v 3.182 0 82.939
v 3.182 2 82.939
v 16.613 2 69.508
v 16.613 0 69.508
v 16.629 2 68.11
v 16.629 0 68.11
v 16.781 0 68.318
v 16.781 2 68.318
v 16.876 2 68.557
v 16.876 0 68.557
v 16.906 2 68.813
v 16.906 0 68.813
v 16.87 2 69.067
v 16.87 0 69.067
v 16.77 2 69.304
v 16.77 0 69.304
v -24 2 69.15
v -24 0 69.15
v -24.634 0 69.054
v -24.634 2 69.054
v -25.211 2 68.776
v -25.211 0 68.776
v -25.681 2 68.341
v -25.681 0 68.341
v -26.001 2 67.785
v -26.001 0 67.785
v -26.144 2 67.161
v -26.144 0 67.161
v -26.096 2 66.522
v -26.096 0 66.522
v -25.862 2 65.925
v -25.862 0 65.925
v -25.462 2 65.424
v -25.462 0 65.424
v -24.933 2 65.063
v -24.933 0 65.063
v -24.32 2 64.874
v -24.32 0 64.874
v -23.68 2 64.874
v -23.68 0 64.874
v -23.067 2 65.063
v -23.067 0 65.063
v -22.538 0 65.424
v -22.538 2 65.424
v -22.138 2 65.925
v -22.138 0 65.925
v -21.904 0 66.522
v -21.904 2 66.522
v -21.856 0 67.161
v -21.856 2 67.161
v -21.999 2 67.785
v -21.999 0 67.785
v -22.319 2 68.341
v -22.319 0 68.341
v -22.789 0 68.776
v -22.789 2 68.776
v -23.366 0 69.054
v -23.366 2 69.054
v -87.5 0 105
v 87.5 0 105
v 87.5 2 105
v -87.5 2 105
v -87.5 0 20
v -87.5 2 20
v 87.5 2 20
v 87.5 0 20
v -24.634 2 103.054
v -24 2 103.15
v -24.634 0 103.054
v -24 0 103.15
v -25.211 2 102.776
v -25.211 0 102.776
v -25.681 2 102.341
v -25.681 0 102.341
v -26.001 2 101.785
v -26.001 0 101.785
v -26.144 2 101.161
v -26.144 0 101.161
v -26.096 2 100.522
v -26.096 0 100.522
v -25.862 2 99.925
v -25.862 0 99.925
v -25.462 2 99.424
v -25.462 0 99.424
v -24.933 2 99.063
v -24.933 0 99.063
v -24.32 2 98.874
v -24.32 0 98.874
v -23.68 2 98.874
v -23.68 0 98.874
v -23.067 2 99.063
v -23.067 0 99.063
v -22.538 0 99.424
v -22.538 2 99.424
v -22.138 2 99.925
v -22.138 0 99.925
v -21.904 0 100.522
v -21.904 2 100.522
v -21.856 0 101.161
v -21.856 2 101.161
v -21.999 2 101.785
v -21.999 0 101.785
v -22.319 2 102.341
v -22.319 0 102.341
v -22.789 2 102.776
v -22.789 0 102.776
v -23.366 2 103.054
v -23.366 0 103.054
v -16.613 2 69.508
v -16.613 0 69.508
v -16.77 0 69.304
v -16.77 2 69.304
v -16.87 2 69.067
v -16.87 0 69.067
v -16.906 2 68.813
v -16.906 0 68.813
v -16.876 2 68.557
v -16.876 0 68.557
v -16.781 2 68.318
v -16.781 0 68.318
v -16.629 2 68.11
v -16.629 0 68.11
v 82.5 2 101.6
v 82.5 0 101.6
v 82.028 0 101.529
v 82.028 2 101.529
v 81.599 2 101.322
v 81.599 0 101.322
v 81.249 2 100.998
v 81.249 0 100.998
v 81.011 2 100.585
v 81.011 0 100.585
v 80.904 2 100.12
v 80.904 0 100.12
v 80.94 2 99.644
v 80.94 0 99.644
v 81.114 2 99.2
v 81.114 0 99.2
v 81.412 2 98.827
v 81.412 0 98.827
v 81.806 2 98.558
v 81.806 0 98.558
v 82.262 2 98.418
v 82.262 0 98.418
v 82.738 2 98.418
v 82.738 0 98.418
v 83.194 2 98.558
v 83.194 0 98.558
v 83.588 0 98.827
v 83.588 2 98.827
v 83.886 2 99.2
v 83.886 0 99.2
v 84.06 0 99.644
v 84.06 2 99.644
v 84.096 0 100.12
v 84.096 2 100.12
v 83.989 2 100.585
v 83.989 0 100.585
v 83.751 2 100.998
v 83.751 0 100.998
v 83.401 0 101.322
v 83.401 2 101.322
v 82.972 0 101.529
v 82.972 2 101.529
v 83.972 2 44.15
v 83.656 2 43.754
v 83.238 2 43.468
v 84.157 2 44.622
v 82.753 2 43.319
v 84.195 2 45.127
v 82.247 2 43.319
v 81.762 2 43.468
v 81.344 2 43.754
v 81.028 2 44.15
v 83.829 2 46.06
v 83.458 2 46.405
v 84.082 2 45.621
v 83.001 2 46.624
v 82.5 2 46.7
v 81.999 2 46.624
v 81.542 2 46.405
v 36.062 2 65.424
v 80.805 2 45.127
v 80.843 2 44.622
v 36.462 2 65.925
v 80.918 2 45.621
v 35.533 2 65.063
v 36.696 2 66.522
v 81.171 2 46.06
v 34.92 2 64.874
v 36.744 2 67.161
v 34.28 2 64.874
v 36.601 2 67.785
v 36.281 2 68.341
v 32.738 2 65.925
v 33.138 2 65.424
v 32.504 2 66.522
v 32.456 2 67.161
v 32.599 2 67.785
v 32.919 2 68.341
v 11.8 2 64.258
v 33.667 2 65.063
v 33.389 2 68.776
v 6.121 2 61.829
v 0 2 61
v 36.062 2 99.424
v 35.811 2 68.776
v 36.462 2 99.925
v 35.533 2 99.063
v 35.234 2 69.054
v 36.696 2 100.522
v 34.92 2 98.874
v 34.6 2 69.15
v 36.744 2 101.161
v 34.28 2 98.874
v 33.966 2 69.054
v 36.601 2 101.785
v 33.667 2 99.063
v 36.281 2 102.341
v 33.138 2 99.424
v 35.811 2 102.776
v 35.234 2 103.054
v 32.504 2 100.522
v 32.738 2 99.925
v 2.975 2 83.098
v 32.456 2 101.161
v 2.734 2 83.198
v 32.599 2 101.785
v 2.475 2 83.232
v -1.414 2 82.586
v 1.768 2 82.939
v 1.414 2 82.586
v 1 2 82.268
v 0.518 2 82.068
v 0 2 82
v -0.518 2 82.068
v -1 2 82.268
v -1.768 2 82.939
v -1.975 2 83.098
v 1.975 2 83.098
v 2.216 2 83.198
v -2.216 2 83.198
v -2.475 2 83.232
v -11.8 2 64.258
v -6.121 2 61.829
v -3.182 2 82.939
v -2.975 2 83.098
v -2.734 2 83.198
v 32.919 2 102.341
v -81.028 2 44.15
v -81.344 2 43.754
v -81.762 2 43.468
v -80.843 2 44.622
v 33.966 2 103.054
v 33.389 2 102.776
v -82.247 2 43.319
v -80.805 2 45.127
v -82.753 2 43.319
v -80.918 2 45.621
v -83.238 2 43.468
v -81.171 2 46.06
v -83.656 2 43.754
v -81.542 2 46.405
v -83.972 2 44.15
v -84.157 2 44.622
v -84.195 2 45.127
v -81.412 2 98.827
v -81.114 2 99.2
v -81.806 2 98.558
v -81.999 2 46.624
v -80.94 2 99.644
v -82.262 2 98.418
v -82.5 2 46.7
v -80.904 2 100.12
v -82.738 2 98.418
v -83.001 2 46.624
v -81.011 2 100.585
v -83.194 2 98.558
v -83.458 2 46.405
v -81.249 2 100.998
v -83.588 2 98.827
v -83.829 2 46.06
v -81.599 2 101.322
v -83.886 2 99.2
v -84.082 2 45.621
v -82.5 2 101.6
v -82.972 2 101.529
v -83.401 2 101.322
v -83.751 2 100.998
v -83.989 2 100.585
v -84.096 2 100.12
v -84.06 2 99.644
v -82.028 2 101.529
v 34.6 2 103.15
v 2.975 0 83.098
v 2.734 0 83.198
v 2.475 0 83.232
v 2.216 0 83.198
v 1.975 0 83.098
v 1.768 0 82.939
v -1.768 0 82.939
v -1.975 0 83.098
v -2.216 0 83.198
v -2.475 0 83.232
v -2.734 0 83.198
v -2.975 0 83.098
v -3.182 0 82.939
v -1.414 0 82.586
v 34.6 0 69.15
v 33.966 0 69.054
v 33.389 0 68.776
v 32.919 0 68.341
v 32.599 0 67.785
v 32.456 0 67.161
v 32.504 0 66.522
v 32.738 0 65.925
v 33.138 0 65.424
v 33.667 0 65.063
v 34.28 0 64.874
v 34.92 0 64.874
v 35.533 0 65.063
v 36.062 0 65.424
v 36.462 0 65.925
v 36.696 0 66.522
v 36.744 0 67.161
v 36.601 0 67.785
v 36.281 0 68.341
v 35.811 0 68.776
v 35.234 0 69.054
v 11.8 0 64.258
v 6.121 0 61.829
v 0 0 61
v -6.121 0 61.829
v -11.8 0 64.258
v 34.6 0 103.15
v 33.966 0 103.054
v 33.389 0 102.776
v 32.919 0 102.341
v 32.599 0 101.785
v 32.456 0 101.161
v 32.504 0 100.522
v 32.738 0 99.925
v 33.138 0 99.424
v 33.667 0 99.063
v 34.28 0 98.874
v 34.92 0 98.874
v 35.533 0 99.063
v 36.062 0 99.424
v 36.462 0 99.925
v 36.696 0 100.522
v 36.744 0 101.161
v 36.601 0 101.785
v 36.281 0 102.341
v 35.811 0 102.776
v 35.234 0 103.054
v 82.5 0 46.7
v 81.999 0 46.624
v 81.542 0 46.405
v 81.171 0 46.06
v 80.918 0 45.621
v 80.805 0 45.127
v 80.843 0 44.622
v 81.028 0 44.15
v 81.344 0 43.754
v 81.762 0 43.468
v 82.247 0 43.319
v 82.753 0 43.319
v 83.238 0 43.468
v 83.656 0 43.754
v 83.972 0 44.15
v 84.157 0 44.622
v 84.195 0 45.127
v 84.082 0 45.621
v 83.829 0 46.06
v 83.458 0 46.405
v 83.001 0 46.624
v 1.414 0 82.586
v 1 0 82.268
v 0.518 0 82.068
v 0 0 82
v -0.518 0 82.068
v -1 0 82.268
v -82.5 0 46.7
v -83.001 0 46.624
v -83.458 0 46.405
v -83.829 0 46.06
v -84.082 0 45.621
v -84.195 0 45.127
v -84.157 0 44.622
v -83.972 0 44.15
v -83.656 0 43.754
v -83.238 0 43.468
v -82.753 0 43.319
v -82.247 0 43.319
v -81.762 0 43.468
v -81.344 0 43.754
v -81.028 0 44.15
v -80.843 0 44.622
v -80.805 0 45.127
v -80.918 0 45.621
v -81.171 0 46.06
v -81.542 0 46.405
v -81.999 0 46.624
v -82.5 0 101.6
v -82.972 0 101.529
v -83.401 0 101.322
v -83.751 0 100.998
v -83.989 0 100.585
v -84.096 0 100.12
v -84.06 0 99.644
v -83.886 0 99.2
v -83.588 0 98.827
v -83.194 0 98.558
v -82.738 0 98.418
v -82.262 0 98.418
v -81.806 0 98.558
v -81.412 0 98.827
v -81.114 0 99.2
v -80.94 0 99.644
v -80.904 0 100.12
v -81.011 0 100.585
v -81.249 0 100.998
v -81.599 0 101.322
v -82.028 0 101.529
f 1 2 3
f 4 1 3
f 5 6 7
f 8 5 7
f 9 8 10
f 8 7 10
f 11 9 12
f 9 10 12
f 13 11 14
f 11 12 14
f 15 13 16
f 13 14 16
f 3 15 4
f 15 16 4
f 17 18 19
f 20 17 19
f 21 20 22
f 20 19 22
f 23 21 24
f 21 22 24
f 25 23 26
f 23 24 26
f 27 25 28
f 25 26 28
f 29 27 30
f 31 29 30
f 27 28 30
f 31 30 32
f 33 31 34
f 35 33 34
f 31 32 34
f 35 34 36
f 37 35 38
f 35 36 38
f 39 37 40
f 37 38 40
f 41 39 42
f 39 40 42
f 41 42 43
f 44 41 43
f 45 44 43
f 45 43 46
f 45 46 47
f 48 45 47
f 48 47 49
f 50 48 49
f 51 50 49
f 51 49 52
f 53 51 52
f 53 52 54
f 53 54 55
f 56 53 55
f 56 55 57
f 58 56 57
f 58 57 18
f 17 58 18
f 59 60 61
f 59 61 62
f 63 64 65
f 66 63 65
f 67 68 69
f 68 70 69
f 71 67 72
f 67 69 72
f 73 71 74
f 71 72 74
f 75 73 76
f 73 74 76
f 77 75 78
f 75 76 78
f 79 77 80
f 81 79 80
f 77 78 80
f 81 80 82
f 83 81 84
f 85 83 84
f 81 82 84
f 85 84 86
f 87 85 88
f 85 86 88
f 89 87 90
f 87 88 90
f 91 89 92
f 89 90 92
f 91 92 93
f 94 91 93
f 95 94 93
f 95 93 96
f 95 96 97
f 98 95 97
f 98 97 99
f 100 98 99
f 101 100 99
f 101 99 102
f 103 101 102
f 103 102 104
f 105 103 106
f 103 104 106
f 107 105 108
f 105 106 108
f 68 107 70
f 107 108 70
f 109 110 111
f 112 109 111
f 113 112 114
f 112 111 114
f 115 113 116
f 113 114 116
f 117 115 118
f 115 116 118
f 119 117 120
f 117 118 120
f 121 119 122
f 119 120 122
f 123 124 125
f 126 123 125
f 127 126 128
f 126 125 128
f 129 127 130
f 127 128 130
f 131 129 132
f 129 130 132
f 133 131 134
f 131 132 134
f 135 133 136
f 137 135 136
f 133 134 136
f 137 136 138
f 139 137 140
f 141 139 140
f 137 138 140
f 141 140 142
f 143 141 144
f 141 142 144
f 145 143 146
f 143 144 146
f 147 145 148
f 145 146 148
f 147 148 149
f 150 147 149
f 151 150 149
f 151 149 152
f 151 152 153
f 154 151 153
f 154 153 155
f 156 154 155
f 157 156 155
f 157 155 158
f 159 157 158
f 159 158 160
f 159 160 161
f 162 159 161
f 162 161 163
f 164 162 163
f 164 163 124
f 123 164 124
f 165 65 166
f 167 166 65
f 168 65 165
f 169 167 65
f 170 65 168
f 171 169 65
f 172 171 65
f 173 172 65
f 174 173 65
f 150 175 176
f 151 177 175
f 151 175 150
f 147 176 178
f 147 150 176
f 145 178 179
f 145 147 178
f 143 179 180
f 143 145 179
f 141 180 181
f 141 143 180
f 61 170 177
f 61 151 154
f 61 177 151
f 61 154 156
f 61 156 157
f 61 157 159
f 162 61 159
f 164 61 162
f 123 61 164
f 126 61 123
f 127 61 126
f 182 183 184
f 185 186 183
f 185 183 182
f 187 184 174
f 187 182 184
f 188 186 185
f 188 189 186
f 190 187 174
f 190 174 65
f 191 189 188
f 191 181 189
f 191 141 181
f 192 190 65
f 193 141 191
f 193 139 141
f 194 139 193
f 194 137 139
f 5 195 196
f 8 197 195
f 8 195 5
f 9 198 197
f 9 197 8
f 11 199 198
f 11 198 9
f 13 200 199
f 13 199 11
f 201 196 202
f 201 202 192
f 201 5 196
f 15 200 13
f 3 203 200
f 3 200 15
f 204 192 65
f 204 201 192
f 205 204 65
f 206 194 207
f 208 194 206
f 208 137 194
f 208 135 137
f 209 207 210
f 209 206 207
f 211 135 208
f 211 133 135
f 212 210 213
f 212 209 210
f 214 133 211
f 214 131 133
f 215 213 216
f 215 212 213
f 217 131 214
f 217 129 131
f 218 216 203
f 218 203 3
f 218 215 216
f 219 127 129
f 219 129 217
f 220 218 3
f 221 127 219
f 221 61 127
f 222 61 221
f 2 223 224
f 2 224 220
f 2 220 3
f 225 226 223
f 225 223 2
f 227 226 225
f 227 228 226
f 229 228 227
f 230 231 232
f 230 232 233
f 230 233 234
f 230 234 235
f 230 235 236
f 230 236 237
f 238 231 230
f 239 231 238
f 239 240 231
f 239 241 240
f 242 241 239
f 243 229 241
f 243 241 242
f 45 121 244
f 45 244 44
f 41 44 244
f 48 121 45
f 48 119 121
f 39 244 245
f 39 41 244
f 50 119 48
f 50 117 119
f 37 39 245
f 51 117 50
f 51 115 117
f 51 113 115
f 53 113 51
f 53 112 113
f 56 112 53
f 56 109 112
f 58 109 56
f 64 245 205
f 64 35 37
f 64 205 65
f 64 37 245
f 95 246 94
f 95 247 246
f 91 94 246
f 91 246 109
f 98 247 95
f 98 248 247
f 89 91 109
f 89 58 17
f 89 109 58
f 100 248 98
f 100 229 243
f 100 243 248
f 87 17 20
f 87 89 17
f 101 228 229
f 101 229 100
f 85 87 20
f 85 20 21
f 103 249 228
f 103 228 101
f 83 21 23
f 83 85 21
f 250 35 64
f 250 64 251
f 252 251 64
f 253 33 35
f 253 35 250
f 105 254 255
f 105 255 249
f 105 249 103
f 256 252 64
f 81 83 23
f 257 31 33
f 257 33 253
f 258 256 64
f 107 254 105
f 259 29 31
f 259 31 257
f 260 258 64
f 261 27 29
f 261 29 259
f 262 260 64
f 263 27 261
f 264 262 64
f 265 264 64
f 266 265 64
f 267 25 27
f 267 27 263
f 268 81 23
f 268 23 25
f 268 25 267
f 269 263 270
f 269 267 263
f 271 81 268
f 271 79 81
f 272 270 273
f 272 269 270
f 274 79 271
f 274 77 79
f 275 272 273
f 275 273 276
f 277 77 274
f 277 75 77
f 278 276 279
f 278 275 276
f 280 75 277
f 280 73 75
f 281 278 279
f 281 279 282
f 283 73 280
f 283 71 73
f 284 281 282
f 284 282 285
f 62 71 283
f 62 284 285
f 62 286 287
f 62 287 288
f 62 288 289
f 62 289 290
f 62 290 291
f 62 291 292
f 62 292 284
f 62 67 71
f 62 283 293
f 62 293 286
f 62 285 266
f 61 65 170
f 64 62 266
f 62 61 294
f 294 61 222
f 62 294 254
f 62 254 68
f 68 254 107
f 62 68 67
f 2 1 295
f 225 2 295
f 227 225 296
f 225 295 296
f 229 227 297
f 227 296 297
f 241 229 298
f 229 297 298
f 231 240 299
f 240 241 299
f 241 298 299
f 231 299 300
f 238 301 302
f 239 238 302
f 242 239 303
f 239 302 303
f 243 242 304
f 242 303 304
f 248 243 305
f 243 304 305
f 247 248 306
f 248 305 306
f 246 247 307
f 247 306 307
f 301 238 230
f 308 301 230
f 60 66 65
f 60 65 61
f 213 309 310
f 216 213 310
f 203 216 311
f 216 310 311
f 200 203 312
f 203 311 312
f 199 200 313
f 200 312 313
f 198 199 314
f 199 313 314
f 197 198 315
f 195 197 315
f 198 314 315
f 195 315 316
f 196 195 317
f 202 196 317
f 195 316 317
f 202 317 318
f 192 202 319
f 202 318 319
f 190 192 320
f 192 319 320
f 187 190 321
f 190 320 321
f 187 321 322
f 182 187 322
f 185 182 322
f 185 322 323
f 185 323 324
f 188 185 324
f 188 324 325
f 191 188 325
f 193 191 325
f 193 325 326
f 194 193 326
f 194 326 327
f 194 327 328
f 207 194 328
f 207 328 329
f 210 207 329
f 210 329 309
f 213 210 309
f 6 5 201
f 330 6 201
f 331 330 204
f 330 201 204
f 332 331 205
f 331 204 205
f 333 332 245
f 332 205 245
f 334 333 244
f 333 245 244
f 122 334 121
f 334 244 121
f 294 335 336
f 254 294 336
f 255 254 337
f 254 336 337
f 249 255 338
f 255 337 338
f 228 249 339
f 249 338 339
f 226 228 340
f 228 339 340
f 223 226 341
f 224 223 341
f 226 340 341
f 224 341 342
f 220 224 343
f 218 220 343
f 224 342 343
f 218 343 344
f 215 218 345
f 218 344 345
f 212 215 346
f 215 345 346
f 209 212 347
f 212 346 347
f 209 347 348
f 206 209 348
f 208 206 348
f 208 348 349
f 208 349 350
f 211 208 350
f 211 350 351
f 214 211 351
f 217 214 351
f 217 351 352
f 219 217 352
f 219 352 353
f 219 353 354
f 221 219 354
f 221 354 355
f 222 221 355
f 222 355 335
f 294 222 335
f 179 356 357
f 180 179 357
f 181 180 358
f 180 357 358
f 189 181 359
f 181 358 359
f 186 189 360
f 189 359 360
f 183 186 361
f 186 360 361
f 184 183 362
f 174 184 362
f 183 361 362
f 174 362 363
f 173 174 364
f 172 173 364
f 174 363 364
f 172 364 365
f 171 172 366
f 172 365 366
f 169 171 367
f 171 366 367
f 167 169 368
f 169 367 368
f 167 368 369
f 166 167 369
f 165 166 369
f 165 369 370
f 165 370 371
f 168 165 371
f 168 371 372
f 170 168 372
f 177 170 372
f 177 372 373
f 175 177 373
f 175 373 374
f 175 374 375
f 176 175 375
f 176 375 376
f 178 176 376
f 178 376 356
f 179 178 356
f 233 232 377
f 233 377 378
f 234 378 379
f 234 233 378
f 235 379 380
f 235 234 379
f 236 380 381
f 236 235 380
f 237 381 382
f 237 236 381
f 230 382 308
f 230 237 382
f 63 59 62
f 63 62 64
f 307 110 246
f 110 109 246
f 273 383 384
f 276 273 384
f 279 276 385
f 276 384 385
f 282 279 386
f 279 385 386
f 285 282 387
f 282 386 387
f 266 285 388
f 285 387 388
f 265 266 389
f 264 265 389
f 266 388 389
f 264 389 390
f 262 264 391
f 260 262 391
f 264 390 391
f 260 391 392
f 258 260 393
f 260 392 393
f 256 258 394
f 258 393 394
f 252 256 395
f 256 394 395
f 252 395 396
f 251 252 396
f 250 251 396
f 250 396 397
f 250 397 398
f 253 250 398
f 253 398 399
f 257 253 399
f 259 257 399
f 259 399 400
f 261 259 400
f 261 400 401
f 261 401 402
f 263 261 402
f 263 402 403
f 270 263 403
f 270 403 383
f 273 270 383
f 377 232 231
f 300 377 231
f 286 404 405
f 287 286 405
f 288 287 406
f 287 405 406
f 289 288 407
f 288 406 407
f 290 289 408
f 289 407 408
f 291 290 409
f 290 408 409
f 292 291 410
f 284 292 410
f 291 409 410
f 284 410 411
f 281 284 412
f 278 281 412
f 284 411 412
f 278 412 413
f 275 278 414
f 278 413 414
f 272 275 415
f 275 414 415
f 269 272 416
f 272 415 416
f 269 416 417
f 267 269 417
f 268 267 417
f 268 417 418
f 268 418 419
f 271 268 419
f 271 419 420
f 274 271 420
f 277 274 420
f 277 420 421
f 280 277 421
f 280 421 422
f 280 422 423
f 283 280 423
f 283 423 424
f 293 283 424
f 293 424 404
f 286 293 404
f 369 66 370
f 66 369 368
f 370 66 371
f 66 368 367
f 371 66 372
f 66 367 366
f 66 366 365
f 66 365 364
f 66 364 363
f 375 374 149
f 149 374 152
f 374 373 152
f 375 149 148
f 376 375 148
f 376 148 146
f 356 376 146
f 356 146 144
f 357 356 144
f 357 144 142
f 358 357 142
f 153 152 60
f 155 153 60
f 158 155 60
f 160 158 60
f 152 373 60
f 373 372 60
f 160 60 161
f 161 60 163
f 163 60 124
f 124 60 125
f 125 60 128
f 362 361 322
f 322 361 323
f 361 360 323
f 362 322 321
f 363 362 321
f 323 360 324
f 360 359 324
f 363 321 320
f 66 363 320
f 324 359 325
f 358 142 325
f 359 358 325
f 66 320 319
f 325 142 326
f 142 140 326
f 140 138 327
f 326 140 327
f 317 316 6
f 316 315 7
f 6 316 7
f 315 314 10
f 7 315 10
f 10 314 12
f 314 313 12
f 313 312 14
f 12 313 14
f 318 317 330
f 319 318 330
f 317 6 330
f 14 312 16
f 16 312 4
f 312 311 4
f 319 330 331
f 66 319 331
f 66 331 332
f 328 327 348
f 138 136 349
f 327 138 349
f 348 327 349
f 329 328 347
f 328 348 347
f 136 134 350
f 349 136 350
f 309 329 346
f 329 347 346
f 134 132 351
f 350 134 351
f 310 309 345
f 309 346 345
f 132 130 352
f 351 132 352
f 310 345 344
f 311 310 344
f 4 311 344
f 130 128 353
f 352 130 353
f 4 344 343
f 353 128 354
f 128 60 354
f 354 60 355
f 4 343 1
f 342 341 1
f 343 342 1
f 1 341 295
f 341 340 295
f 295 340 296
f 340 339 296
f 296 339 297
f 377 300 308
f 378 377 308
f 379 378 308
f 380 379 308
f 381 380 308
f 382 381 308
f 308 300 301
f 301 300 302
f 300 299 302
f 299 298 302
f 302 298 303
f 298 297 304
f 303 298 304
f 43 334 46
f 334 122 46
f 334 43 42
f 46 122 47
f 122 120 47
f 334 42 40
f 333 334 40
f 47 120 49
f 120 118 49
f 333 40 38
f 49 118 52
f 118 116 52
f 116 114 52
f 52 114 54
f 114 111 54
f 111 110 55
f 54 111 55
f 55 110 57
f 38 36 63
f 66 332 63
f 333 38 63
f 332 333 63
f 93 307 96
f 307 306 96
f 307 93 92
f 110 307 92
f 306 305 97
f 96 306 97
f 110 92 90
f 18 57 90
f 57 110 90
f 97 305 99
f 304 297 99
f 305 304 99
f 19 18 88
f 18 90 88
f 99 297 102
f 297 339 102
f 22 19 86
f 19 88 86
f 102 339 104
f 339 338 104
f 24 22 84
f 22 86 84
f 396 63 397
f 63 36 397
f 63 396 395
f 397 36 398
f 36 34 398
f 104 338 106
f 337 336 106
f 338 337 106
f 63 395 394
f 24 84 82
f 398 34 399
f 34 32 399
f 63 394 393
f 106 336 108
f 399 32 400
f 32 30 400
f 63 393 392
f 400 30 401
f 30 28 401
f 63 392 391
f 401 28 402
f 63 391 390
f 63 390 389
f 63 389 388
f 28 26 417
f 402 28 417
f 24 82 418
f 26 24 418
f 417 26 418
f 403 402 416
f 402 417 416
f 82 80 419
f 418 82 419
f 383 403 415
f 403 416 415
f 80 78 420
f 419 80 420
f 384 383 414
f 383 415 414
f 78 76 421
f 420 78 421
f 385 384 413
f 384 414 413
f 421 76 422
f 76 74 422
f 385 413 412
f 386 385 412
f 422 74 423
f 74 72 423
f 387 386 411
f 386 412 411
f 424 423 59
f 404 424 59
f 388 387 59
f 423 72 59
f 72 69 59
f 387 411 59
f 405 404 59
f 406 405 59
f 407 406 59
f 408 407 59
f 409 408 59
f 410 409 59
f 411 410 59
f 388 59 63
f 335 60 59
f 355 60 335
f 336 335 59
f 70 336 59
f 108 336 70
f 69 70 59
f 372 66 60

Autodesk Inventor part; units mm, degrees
ref_plane "YZ Plane" through (0, 0, 0) normal (1, 0, 0) x (0, 1, 0)
ref_plane "XZ Plane" through (0, 0, 0) normal (0, 1, 0) x (-1, 0, 0)
ref_plane "XY Plane" through (0, 0, 0) normal (0, 0, 1) x (1, 0, 0)
sketch "スケッチ1" plane through (0, 0, 0) normal (0, 1, 0) x (-1, 0, 0)
  line L0 (-87.5, 105) -> (87.5, 105)
  line L1 (87.5, 105) -> (87.5, -105)
  line L2 (87.5, -105) -> (-87.5, -105)
  line L3 (-87.5, -105) -> (-87.5, 105)
  line L4 (-87.5, 105) -> (87.5, -105) construction
  line L5 (87.5, 105) -> (-87.5, -105) construction
  point P0 (0, 0)
  dimension "d0" = 210
  dimension "d1" = 175
extrude "プレート1" add sketch "スケッチ1" along normal blind 2
sketch "スケッチ5" plane through (0, 2, 0) normal (0, 1, 0) x (1, 0, 0)
  line L0 (-24, -101) -> (34.6, -101)
  line L1 (34.6, -101) -> (34.6, -67)
  line L2 (34.6, -67) -> (-24, -67)
  line L3 (-24, -67) -> (-24, -101)
  line L4 (-24, -101) -> (34.6, -67) construction
  line L5 (34.6, -101) -> (-24, -67) construction
  line L6 (87.5, -105) -> (-87.5, -105) projected
  point P0 (0, 0)
  point P1 (0, -84)
  point P2 (5.3, -84)
  point P3 (5.3, -84)
  dimension "d31" = 58.6
  dimension "d32" = 24
  dimension "d33" = 34
  dimension "d78" = 4
hole "穴3" at (34.6, 2, 67) at (34.6, 2, 101) at (-24, 2, 67) at (-24, 2, 101) direction (0, -1, 0) diameter 4.3 end through all clearance for "Socket Head Cap Screw" size "M4" standard "Ansi Metric M Profile"
sketch "スケッチ6" plane through (0, 2, 0) normal (0, 1, 0) x (1, 0, 0)
  line L0 (-133.9967, -217.2896) -> (133.2896, 49.9967)
  line L1 (133.2896, 49.9967) -> (133.9967, 49.2896)
  line L2 (133.9967, 49.2896) -> (-133.2896, -217.9967)
  line L3 (-133.2896, -217.9967) -> (-133.9967, -217.2896)
  line L4 (-133.9967, -217.2896) -> (133.9967, 49.2896) construction
  line L5 (133.2896, 49.9967) -> (-133.2896, -217.9967) construction
  line L6 (133.9967, -217.2896) -> (-133.2896, 49.9967)
  line L7 (-133.2896, 49.9967) -> (-133.9967, 49.2896)
  line L8 (-133.9967, 49.2896) -> (133.2896, -217.9967)
  line L9 (133.2896, -217.9967) -> (133.9967, -217.2896)
  line L10 (133.9967, -217.2896) -> (-133.9967, 49.2896) construction
  line L11 (-133.2896, 49.9967) -> (133.2896, -217.9967) construction
  line L12 (-2.4749, -82.2322) -> (-1.7678, -81.5251)
  circle A0 centre (0, -84) radius 22
  line L13 (2.4749, -82.2322) -> (1.7678, -81.5251)
  circle A1 centre (0, -84) radius 3
  line L14 (-87.5, -105) -> (-87.5, 105) projected
  line L15 (87.5, 105) -> (87.5, -105) projected
  line L16 (122.5, 0) -> (-122.5, 0) projected
  point P0 (0, 0)
  point P1 (0, -84)
  point P2 (-2.1213, -81.8787)
  point P3 (2.1213, -81.8787)
  point P4 (15.9059, -68.8012)
  point P5 (-15.9059, -68.8012)
  dimension "d54" = 1
  dimension "d55" = 1
  dimension "d57" = 44
  dimension "d59" = 3
  dimension "d60" = 3
  dimension "d65" = 186
  dimension "d66" = 186
  dimension "d79" = 45
  dimension "d80" = 45
extrude "押し出し2" cut sketch "スケッチ6" against normal blind 10 contours A0 L6 L12 L8 | A0 L0 A1 L6 | L12 L6 A1 | A0 L2 L13 L0 | L0 L13 A1
sketch "スケッチ7" plane through (0, 2, 0) normal (0, 1, 0) x (1, 0, 0)
  line L0 (-82.5, -100) -> (82.5, -100)
  line L1 (82.5, -100) -> (82.5, 100)
  line L2 (82.5, 100) -> (-82.5, 100)
  line L3 (-82.5, 100) -> (-82.5, -100)
  line L4 (-82.5, -100) -> (82.5, 100) construction
  line L5 (82.5, -100) -> (-82.5, 100) construction
  line L6 (-87.5, -105) -> (-87.5, 105) projected
  line L7 (87.5, -105) -> (-87.5, -105) projected
  point P0 (0, 0)
  point P1 (-82.5, -45)
  point P2 (-82.5, -10)
  point P3 (82.5, -45)
  point P4 (82.5, -10)
  dimension "d45" = 5
  dimension "d46" = 5
  dimension "d67" = 55
  dimension "d68" = 35
  dimension "d69" = 55
  dimension "d70" = 35
hole "穴4" at (-82.5, 2, -100) at (82.5, 2, -100) at (-82.5, 2, 100) at (82.5, 2, 100) direction (0, -1, 0) diameter 3.2 end through all clearance for "Socket Head Cap Screw" size "M3" standard "Ansi Metric M Profile"
sketch "スケッチ8" plane through (0, 2, 0) normal (0, 1, 0) x (1, 0, 0)
  line L0 (15.9059, -68.8012) -> (2.4749, -82.2322) projected
  line L1 (-2.1213, -81.8787) -> (-2.4749, -82.2322) projected
  arc A0 (2.1213, -81.8787) -> (-2.1213, -81.8787) centre (0, -84) ccw projected
  line L2 (2.4749, -82.2322) -> (2.1213, -81.8787) projected
  line L3 (-2.4749, -82.2322) -> (-15.9059, -68.8012) projected
  arc A1 (15.9059, -68.8012) -> (-15.9059, -68.8012) centre (0, -84) ccw projected
  line L4 (2.4749, -83.6464) -> (17.2895, -68.8318)
  arc A2 (17.2895, -68.8318) -> (-17.2895, -68.8318) centre (0, -84) ccw
  line L5 (-17.2895, -68.8318) -> (-2.4749, -83.6464)
  line L6 (-2.4749, -83.6464) -> (-1.4142, -82.5858)
  arc A3 (1.4142, -82.5858) -> (-1.4142, -82.5858) centre (0, -84) ccw
  line L7 (1.4142, -82.5858) -> (2.4749, -83.6464)
  point P0 (0, 0)
  dimension "d61" = 1
extrude "押し出し3" cut sketch "スケッチ8" against normal blind 10 contours L0 L2 A0 L1 L3 A1 | L7 A3 L6 L5 A2 L4
fillet "コーナーR1" radius 1 4 edges at (-2.4749, 1, 83.6464) (2.4749, 1, 83.6464) (-17.2895, 1, 68.8318) (17.2895, 1, 68.8318)
hole "穴5" at (-82.5, 2, 45) at (-82.5, 2, 10) at (82.5, 2, 45) at (82.5, 2, 10) direction (0, -1, 0) diameter 3.4 end through all clearance for "Flat Head Machine Screw" size "M3" standard "Ansi Metric M Profile"
ref_plane "作業平面1" through (-87.5, 0, 20) normal (0, 0, 1) x (1, 0, 0)
sketch "スケッチ9" plane through (-87.5, 0, 20) normal (0, 0, 1) x (1, 0, 0)
  line L0 (175, 0) -> (175, 2) projected
  line L1 (0, 0) -> (175, 0)
  line L2 (175, 0) -> (175, 2)
  line L3 (175, 2) -> (0, 2)
  line L4 (0, 2) -> (0, 0)
  point P0 (87.5, 0)
extrude "押し出し4" cut sketch "スケッチ9" against normal blind 159
equation "\"d40\" = Thickness"
equation "\"d60\" = d59"
equation "\"d66\" = d65"
equation "\"d69\" = d67"
equation "\"d70\" = d68"
equation "\"d76\" = Thickness"
equation "\"d2\" = Thickness"
equation "\"BendRadius\" = Thickness"
equation "\"BendReliefWidth\" = Thickness"
equation "\"BendReliefDepth\" = 0.5 * Thickness"
equation "\"CornerReliefSize\" = 4 * Thickness"
equation "\"MinimumRemnant\" = 2 * Thickness"
equation "\"TransitionRadius\" = BendRadius"
equation "\"JacobiRadiusSize\" = BendRadius"
equation "\"GapSize\" = Thickness"
equation "\"Thickness\" = 2"
properties part number "s_carbon_plate1" material "CFRP"
